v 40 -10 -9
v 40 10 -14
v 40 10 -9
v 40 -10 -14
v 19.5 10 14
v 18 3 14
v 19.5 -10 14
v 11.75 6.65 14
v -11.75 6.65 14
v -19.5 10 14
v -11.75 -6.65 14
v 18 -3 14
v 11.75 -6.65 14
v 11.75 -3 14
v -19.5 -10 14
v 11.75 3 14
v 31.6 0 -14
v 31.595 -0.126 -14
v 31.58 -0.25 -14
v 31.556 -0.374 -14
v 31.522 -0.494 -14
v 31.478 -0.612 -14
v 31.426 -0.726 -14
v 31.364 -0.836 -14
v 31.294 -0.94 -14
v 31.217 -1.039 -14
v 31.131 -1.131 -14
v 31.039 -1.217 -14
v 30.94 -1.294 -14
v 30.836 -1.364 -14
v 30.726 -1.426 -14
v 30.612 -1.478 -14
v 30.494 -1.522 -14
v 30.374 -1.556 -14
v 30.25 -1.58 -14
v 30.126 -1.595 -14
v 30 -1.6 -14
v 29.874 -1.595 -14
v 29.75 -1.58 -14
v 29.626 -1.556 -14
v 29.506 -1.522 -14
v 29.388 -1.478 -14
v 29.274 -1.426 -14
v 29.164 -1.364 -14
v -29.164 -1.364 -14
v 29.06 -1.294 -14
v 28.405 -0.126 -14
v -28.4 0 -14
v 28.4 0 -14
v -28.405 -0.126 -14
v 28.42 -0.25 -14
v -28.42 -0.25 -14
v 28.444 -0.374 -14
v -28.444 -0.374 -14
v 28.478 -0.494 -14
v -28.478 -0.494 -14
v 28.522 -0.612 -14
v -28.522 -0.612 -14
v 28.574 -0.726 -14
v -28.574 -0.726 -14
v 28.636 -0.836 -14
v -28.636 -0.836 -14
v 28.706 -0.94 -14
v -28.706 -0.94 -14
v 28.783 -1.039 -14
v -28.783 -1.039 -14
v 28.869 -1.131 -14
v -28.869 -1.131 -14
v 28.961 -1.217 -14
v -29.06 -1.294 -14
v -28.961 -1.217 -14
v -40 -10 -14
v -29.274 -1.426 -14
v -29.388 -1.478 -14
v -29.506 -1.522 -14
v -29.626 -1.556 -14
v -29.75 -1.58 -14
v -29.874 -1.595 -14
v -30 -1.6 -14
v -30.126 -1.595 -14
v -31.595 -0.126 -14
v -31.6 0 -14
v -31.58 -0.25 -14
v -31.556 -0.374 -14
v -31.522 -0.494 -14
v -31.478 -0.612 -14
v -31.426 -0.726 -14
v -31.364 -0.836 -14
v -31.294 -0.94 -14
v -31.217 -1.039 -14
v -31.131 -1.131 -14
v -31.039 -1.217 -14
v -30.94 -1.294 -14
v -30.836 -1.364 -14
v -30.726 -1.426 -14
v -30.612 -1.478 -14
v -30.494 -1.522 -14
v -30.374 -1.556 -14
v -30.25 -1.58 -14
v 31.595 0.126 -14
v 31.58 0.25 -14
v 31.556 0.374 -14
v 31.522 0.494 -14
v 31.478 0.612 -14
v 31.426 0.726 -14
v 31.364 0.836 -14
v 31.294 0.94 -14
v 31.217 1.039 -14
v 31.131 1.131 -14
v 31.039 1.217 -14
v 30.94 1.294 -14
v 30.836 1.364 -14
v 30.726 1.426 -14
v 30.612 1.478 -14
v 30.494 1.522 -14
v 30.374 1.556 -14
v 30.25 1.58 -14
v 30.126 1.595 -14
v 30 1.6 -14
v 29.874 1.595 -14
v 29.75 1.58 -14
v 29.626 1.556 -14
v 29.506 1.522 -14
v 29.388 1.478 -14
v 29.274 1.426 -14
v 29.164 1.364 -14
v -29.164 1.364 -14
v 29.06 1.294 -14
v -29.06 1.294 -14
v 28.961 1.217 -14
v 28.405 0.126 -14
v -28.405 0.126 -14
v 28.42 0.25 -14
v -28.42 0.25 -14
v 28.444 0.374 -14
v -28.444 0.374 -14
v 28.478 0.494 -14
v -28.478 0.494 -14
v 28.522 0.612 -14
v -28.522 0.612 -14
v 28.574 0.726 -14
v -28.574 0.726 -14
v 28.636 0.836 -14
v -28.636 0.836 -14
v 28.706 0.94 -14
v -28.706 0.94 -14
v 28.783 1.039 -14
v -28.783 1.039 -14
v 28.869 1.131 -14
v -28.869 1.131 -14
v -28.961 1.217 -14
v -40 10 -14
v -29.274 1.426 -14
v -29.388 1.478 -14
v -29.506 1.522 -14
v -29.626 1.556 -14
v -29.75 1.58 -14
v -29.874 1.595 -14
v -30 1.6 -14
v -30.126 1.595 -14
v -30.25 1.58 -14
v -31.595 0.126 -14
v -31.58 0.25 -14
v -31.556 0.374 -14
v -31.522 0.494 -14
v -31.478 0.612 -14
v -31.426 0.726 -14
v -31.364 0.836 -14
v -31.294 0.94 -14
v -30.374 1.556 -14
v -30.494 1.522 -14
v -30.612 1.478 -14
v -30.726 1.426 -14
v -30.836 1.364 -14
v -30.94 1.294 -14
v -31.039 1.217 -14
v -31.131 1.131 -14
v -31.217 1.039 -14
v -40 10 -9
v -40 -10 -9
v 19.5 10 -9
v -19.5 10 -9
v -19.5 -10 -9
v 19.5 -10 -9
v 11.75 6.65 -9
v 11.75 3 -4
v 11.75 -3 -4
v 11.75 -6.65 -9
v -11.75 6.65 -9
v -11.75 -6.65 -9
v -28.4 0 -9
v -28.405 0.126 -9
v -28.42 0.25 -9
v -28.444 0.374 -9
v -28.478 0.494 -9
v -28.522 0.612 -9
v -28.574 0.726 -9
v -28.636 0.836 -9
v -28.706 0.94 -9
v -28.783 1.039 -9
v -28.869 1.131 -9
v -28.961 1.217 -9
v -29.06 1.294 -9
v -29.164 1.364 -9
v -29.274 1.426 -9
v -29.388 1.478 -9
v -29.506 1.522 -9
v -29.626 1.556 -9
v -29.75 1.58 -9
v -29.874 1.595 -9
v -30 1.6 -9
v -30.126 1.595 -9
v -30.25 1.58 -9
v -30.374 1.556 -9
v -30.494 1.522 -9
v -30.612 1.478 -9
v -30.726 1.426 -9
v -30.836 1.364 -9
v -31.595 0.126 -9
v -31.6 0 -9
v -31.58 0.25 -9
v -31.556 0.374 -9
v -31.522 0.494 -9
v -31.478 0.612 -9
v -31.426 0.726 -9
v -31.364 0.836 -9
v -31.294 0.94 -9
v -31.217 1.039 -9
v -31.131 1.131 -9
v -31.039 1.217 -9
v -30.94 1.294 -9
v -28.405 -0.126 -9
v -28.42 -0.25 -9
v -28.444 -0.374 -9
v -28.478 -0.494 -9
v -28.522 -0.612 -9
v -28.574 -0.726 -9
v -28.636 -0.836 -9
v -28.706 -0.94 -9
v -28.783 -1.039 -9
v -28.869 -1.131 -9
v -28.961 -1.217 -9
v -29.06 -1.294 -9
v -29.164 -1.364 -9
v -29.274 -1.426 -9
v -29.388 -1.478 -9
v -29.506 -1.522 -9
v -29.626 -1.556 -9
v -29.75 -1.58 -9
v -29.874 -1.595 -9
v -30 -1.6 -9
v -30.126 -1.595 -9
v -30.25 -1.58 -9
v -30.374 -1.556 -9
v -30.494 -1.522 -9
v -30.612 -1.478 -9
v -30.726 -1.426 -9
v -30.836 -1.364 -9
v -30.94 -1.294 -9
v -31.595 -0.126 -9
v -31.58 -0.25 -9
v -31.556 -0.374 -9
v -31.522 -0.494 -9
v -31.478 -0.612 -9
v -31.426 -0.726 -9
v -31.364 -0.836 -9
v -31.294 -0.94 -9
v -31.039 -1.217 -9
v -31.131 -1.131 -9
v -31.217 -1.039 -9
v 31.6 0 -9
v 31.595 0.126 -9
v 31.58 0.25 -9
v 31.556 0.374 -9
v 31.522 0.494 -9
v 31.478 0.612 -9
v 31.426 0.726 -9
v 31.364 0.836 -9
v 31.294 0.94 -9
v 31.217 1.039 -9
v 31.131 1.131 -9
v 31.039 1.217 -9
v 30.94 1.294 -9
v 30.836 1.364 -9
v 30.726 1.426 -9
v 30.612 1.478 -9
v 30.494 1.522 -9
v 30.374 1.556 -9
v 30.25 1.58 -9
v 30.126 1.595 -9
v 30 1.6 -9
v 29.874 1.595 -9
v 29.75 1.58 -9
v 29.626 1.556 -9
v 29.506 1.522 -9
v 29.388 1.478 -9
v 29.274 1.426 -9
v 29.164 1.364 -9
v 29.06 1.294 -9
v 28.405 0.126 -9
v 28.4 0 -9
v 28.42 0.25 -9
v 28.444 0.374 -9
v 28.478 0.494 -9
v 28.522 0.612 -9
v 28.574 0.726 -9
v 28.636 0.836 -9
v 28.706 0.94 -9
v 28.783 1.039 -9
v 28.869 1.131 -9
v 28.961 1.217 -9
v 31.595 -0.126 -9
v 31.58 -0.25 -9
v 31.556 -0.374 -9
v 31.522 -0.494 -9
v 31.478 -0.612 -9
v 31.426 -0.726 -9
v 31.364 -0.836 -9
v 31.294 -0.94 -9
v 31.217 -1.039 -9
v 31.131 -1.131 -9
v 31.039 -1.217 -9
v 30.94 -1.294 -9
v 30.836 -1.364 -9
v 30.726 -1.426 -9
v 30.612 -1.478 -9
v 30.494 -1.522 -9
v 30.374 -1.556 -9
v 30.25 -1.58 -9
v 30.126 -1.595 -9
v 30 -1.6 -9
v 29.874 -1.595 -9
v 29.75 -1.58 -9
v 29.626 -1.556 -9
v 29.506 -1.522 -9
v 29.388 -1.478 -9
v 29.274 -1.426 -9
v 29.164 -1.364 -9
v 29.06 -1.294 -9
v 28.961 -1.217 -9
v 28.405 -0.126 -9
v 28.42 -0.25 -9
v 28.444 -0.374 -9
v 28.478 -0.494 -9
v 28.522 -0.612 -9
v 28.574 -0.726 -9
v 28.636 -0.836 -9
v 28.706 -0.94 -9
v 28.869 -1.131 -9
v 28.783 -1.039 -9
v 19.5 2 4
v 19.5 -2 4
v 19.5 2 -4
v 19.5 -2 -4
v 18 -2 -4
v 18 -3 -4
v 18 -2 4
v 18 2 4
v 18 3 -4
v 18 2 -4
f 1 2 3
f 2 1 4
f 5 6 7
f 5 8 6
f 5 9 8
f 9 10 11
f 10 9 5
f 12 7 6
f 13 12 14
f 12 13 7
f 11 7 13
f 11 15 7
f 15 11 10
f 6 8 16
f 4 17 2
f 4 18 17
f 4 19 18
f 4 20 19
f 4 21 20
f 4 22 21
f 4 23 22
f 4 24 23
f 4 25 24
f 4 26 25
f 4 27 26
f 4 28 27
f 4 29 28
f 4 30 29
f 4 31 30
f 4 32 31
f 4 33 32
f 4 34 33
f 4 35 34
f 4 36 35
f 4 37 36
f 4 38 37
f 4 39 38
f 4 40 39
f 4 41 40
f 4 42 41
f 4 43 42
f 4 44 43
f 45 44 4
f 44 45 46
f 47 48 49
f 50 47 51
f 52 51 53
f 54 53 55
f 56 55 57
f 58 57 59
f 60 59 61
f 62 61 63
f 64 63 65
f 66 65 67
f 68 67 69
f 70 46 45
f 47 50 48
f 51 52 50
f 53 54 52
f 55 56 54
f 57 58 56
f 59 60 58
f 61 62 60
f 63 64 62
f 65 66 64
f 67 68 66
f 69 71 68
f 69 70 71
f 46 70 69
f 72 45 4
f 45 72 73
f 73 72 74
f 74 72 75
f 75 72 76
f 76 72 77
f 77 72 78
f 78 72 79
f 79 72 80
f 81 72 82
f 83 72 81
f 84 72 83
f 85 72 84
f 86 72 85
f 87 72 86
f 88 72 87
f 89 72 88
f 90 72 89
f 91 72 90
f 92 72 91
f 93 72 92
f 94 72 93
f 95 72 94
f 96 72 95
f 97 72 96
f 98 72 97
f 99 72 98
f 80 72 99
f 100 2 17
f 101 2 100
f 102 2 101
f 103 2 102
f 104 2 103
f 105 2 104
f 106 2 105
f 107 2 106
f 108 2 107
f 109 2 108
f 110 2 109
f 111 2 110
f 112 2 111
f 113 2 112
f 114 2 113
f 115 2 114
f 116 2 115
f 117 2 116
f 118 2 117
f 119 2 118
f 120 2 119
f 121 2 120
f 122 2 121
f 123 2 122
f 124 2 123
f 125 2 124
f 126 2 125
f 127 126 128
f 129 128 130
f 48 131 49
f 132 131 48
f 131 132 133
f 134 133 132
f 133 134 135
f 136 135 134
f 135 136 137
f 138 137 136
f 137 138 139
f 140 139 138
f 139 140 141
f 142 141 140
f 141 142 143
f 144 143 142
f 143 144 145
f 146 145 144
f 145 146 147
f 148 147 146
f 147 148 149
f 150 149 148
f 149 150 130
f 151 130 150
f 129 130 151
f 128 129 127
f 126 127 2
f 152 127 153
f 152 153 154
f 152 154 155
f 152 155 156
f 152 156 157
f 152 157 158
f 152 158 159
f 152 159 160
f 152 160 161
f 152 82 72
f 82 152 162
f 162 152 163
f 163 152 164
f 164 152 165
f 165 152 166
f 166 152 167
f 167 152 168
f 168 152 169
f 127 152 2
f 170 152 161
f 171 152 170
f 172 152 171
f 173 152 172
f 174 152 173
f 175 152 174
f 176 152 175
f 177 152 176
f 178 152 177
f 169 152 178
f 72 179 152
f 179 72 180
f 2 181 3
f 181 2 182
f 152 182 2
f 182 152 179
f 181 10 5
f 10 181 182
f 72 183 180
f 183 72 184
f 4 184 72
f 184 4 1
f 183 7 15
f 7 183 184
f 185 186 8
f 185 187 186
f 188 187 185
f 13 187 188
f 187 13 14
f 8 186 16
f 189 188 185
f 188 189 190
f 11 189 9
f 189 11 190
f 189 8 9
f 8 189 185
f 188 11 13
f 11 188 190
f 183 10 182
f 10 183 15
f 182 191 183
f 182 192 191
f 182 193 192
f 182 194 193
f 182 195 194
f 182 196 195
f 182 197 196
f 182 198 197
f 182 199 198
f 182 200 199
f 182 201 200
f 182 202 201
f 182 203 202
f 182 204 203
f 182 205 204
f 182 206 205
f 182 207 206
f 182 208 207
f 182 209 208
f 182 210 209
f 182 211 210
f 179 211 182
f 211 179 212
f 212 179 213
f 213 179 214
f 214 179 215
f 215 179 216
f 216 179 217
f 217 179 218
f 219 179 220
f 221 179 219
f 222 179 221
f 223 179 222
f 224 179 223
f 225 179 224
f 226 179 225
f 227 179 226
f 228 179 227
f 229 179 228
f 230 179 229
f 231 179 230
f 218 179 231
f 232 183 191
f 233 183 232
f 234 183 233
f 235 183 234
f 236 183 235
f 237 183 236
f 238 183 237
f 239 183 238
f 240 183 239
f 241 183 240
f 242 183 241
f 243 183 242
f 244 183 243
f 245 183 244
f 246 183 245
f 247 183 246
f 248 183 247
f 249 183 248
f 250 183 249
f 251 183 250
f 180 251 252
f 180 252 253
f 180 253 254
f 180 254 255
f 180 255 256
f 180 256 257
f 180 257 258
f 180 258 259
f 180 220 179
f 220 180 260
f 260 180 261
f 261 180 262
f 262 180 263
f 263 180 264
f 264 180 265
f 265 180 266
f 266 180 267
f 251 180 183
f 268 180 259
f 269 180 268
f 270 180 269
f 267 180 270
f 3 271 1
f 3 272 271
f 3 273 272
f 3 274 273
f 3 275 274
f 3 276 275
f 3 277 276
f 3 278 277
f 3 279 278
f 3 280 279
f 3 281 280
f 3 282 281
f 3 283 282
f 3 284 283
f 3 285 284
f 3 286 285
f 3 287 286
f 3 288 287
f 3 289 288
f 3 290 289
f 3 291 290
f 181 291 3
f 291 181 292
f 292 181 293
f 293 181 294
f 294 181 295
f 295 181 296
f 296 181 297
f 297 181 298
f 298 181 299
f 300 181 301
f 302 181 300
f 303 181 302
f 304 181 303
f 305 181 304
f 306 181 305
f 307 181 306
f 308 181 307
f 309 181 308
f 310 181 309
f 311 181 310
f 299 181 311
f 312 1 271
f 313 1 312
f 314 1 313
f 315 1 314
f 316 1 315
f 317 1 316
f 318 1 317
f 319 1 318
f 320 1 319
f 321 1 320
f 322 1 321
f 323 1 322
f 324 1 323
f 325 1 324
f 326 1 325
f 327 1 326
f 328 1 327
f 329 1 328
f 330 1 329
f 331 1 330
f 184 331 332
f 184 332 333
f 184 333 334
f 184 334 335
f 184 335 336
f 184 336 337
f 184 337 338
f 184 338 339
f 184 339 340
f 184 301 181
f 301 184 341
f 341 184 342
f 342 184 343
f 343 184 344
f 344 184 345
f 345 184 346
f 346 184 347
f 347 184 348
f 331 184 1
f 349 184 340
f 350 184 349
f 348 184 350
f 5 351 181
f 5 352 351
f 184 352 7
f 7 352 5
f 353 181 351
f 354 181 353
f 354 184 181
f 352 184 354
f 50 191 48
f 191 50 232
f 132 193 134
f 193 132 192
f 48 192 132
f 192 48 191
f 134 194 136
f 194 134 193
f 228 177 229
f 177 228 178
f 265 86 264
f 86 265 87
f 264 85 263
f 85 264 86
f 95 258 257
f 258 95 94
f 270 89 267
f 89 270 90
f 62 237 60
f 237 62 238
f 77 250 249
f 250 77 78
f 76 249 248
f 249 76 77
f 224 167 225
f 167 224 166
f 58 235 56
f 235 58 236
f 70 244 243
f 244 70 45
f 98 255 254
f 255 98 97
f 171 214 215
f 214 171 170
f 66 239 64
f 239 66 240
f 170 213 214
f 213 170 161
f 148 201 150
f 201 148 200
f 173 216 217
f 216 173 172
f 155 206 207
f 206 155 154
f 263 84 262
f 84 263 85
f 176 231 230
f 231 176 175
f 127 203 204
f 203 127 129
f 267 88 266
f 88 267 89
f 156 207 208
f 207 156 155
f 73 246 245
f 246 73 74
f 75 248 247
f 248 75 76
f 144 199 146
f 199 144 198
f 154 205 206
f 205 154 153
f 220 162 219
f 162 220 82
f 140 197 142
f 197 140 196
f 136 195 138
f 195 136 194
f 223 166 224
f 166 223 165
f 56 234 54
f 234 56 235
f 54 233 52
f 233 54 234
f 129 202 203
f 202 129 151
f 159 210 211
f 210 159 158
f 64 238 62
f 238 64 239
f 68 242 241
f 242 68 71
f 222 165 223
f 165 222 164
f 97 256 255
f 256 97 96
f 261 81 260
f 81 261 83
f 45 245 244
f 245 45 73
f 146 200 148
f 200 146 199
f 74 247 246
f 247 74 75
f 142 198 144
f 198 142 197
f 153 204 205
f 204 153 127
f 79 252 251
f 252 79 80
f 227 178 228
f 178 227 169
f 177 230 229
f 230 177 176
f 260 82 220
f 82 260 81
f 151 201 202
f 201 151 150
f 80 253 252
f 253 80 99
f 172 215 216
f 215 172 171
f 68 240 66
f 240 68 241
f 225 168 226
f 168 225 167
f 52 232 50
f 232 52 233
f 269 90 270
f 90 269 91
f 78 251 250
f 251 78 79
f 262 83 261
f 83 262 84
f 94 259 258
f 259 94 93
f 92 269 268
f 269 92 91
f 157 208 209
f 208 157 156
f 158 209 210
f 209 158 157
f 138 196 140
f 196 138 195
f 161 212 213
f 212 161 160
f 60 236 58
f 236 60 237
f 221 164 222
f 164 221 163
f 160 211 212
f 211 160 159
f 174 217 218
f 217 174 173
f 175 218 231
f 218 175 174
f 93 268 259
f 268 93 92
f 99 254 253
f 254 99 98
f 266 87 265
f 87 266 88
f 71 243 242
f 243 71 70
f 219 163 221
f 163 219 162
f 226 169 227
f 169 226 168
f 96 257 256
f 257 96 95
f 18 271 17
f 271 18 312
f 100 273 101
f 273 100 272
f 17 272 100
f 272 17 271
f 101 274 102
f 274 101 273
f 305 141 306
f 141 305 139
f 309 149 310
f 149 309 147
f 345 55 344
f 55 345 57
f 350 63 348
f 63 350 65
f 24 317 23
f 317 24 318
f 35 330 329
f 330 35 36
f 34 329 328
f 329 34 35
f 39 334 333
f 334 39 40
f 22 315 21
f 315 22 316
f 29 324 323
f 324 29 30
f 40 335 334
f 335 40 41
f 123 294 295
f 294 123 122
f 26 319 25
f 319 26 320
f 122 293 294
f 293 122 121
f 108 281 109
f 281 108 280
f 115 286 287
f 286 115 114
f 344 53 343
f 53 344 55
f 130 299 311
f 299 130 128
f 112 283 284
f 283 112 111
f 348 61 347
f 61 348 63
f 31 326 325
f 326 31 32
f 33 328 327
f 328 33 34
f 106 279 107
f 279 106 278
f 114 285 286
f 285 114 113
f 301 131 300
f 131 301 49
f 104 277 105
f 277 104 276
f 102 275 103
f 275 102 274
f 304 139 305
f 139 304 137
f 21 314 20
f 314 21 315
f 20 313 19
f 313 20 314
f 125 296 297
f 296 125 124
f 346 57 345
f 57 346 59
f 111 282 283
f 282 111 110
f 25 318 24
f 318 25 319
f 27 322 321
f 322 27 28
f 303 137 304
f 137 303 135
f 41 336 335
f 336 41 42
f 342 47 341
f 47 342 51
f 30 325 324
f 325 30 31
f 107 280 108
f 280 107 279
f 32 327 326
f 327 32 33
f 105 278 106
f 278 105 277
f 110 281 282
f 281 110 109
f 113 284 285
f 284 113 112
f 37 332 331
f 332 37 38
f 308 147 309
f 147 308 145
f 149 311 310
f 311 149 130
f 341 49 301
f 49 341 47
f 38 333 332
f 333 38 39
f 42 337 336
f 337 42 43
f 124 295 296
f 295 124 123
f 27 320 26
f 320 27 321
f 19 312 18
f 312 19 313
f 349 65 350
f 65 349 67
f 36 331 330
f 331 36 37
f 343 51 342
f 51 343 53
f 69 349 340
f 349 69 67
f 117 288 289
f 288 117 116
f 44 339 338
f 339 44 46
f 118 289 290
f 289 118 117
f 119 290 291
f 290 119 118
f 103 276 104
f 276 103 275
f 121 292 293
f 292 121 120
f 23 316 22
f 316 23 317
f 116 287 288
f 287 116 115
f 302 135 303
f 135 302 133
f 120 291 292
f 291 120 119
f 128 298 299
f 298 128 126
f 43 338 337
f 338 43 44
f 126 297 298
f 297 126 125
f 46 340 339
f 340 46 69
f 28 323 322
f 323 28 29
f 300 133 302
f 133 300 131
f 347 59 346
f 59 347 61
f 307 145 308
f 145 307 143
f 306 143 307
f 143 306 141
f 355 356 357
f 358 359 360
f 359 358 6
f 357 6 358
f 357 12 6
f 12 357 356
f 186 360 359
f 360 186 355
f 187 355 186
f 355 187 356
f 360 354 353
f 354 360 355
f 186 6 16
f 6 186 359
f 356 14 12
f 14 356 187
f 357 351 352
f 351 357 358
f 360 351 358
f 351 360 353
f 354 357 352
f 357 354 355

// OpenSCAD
difference () {

union() {
    cube([80,20,28], center=true);
    cube([40,20,24], center=true);
    
}

    translate([0,0,3]) cube([23.5,13.30,24], center=true);
    translate([-30,0,3]) cube([21,24,24], center=true);
    translate([30,0,3]) cube([21,24,24], center=true);
    translate([-30,0,-12]) cylinder(r=1.6, h=8, center=true, $fn=80);
    translate([30,0,-12]) cylinder(r=1.6, h=8, center=true, $fn=80);

    translate([14,0,6]) cube([8,6,20], center=true);
    translate([18,0,0]) cube([8,4,8], center=true);

}
